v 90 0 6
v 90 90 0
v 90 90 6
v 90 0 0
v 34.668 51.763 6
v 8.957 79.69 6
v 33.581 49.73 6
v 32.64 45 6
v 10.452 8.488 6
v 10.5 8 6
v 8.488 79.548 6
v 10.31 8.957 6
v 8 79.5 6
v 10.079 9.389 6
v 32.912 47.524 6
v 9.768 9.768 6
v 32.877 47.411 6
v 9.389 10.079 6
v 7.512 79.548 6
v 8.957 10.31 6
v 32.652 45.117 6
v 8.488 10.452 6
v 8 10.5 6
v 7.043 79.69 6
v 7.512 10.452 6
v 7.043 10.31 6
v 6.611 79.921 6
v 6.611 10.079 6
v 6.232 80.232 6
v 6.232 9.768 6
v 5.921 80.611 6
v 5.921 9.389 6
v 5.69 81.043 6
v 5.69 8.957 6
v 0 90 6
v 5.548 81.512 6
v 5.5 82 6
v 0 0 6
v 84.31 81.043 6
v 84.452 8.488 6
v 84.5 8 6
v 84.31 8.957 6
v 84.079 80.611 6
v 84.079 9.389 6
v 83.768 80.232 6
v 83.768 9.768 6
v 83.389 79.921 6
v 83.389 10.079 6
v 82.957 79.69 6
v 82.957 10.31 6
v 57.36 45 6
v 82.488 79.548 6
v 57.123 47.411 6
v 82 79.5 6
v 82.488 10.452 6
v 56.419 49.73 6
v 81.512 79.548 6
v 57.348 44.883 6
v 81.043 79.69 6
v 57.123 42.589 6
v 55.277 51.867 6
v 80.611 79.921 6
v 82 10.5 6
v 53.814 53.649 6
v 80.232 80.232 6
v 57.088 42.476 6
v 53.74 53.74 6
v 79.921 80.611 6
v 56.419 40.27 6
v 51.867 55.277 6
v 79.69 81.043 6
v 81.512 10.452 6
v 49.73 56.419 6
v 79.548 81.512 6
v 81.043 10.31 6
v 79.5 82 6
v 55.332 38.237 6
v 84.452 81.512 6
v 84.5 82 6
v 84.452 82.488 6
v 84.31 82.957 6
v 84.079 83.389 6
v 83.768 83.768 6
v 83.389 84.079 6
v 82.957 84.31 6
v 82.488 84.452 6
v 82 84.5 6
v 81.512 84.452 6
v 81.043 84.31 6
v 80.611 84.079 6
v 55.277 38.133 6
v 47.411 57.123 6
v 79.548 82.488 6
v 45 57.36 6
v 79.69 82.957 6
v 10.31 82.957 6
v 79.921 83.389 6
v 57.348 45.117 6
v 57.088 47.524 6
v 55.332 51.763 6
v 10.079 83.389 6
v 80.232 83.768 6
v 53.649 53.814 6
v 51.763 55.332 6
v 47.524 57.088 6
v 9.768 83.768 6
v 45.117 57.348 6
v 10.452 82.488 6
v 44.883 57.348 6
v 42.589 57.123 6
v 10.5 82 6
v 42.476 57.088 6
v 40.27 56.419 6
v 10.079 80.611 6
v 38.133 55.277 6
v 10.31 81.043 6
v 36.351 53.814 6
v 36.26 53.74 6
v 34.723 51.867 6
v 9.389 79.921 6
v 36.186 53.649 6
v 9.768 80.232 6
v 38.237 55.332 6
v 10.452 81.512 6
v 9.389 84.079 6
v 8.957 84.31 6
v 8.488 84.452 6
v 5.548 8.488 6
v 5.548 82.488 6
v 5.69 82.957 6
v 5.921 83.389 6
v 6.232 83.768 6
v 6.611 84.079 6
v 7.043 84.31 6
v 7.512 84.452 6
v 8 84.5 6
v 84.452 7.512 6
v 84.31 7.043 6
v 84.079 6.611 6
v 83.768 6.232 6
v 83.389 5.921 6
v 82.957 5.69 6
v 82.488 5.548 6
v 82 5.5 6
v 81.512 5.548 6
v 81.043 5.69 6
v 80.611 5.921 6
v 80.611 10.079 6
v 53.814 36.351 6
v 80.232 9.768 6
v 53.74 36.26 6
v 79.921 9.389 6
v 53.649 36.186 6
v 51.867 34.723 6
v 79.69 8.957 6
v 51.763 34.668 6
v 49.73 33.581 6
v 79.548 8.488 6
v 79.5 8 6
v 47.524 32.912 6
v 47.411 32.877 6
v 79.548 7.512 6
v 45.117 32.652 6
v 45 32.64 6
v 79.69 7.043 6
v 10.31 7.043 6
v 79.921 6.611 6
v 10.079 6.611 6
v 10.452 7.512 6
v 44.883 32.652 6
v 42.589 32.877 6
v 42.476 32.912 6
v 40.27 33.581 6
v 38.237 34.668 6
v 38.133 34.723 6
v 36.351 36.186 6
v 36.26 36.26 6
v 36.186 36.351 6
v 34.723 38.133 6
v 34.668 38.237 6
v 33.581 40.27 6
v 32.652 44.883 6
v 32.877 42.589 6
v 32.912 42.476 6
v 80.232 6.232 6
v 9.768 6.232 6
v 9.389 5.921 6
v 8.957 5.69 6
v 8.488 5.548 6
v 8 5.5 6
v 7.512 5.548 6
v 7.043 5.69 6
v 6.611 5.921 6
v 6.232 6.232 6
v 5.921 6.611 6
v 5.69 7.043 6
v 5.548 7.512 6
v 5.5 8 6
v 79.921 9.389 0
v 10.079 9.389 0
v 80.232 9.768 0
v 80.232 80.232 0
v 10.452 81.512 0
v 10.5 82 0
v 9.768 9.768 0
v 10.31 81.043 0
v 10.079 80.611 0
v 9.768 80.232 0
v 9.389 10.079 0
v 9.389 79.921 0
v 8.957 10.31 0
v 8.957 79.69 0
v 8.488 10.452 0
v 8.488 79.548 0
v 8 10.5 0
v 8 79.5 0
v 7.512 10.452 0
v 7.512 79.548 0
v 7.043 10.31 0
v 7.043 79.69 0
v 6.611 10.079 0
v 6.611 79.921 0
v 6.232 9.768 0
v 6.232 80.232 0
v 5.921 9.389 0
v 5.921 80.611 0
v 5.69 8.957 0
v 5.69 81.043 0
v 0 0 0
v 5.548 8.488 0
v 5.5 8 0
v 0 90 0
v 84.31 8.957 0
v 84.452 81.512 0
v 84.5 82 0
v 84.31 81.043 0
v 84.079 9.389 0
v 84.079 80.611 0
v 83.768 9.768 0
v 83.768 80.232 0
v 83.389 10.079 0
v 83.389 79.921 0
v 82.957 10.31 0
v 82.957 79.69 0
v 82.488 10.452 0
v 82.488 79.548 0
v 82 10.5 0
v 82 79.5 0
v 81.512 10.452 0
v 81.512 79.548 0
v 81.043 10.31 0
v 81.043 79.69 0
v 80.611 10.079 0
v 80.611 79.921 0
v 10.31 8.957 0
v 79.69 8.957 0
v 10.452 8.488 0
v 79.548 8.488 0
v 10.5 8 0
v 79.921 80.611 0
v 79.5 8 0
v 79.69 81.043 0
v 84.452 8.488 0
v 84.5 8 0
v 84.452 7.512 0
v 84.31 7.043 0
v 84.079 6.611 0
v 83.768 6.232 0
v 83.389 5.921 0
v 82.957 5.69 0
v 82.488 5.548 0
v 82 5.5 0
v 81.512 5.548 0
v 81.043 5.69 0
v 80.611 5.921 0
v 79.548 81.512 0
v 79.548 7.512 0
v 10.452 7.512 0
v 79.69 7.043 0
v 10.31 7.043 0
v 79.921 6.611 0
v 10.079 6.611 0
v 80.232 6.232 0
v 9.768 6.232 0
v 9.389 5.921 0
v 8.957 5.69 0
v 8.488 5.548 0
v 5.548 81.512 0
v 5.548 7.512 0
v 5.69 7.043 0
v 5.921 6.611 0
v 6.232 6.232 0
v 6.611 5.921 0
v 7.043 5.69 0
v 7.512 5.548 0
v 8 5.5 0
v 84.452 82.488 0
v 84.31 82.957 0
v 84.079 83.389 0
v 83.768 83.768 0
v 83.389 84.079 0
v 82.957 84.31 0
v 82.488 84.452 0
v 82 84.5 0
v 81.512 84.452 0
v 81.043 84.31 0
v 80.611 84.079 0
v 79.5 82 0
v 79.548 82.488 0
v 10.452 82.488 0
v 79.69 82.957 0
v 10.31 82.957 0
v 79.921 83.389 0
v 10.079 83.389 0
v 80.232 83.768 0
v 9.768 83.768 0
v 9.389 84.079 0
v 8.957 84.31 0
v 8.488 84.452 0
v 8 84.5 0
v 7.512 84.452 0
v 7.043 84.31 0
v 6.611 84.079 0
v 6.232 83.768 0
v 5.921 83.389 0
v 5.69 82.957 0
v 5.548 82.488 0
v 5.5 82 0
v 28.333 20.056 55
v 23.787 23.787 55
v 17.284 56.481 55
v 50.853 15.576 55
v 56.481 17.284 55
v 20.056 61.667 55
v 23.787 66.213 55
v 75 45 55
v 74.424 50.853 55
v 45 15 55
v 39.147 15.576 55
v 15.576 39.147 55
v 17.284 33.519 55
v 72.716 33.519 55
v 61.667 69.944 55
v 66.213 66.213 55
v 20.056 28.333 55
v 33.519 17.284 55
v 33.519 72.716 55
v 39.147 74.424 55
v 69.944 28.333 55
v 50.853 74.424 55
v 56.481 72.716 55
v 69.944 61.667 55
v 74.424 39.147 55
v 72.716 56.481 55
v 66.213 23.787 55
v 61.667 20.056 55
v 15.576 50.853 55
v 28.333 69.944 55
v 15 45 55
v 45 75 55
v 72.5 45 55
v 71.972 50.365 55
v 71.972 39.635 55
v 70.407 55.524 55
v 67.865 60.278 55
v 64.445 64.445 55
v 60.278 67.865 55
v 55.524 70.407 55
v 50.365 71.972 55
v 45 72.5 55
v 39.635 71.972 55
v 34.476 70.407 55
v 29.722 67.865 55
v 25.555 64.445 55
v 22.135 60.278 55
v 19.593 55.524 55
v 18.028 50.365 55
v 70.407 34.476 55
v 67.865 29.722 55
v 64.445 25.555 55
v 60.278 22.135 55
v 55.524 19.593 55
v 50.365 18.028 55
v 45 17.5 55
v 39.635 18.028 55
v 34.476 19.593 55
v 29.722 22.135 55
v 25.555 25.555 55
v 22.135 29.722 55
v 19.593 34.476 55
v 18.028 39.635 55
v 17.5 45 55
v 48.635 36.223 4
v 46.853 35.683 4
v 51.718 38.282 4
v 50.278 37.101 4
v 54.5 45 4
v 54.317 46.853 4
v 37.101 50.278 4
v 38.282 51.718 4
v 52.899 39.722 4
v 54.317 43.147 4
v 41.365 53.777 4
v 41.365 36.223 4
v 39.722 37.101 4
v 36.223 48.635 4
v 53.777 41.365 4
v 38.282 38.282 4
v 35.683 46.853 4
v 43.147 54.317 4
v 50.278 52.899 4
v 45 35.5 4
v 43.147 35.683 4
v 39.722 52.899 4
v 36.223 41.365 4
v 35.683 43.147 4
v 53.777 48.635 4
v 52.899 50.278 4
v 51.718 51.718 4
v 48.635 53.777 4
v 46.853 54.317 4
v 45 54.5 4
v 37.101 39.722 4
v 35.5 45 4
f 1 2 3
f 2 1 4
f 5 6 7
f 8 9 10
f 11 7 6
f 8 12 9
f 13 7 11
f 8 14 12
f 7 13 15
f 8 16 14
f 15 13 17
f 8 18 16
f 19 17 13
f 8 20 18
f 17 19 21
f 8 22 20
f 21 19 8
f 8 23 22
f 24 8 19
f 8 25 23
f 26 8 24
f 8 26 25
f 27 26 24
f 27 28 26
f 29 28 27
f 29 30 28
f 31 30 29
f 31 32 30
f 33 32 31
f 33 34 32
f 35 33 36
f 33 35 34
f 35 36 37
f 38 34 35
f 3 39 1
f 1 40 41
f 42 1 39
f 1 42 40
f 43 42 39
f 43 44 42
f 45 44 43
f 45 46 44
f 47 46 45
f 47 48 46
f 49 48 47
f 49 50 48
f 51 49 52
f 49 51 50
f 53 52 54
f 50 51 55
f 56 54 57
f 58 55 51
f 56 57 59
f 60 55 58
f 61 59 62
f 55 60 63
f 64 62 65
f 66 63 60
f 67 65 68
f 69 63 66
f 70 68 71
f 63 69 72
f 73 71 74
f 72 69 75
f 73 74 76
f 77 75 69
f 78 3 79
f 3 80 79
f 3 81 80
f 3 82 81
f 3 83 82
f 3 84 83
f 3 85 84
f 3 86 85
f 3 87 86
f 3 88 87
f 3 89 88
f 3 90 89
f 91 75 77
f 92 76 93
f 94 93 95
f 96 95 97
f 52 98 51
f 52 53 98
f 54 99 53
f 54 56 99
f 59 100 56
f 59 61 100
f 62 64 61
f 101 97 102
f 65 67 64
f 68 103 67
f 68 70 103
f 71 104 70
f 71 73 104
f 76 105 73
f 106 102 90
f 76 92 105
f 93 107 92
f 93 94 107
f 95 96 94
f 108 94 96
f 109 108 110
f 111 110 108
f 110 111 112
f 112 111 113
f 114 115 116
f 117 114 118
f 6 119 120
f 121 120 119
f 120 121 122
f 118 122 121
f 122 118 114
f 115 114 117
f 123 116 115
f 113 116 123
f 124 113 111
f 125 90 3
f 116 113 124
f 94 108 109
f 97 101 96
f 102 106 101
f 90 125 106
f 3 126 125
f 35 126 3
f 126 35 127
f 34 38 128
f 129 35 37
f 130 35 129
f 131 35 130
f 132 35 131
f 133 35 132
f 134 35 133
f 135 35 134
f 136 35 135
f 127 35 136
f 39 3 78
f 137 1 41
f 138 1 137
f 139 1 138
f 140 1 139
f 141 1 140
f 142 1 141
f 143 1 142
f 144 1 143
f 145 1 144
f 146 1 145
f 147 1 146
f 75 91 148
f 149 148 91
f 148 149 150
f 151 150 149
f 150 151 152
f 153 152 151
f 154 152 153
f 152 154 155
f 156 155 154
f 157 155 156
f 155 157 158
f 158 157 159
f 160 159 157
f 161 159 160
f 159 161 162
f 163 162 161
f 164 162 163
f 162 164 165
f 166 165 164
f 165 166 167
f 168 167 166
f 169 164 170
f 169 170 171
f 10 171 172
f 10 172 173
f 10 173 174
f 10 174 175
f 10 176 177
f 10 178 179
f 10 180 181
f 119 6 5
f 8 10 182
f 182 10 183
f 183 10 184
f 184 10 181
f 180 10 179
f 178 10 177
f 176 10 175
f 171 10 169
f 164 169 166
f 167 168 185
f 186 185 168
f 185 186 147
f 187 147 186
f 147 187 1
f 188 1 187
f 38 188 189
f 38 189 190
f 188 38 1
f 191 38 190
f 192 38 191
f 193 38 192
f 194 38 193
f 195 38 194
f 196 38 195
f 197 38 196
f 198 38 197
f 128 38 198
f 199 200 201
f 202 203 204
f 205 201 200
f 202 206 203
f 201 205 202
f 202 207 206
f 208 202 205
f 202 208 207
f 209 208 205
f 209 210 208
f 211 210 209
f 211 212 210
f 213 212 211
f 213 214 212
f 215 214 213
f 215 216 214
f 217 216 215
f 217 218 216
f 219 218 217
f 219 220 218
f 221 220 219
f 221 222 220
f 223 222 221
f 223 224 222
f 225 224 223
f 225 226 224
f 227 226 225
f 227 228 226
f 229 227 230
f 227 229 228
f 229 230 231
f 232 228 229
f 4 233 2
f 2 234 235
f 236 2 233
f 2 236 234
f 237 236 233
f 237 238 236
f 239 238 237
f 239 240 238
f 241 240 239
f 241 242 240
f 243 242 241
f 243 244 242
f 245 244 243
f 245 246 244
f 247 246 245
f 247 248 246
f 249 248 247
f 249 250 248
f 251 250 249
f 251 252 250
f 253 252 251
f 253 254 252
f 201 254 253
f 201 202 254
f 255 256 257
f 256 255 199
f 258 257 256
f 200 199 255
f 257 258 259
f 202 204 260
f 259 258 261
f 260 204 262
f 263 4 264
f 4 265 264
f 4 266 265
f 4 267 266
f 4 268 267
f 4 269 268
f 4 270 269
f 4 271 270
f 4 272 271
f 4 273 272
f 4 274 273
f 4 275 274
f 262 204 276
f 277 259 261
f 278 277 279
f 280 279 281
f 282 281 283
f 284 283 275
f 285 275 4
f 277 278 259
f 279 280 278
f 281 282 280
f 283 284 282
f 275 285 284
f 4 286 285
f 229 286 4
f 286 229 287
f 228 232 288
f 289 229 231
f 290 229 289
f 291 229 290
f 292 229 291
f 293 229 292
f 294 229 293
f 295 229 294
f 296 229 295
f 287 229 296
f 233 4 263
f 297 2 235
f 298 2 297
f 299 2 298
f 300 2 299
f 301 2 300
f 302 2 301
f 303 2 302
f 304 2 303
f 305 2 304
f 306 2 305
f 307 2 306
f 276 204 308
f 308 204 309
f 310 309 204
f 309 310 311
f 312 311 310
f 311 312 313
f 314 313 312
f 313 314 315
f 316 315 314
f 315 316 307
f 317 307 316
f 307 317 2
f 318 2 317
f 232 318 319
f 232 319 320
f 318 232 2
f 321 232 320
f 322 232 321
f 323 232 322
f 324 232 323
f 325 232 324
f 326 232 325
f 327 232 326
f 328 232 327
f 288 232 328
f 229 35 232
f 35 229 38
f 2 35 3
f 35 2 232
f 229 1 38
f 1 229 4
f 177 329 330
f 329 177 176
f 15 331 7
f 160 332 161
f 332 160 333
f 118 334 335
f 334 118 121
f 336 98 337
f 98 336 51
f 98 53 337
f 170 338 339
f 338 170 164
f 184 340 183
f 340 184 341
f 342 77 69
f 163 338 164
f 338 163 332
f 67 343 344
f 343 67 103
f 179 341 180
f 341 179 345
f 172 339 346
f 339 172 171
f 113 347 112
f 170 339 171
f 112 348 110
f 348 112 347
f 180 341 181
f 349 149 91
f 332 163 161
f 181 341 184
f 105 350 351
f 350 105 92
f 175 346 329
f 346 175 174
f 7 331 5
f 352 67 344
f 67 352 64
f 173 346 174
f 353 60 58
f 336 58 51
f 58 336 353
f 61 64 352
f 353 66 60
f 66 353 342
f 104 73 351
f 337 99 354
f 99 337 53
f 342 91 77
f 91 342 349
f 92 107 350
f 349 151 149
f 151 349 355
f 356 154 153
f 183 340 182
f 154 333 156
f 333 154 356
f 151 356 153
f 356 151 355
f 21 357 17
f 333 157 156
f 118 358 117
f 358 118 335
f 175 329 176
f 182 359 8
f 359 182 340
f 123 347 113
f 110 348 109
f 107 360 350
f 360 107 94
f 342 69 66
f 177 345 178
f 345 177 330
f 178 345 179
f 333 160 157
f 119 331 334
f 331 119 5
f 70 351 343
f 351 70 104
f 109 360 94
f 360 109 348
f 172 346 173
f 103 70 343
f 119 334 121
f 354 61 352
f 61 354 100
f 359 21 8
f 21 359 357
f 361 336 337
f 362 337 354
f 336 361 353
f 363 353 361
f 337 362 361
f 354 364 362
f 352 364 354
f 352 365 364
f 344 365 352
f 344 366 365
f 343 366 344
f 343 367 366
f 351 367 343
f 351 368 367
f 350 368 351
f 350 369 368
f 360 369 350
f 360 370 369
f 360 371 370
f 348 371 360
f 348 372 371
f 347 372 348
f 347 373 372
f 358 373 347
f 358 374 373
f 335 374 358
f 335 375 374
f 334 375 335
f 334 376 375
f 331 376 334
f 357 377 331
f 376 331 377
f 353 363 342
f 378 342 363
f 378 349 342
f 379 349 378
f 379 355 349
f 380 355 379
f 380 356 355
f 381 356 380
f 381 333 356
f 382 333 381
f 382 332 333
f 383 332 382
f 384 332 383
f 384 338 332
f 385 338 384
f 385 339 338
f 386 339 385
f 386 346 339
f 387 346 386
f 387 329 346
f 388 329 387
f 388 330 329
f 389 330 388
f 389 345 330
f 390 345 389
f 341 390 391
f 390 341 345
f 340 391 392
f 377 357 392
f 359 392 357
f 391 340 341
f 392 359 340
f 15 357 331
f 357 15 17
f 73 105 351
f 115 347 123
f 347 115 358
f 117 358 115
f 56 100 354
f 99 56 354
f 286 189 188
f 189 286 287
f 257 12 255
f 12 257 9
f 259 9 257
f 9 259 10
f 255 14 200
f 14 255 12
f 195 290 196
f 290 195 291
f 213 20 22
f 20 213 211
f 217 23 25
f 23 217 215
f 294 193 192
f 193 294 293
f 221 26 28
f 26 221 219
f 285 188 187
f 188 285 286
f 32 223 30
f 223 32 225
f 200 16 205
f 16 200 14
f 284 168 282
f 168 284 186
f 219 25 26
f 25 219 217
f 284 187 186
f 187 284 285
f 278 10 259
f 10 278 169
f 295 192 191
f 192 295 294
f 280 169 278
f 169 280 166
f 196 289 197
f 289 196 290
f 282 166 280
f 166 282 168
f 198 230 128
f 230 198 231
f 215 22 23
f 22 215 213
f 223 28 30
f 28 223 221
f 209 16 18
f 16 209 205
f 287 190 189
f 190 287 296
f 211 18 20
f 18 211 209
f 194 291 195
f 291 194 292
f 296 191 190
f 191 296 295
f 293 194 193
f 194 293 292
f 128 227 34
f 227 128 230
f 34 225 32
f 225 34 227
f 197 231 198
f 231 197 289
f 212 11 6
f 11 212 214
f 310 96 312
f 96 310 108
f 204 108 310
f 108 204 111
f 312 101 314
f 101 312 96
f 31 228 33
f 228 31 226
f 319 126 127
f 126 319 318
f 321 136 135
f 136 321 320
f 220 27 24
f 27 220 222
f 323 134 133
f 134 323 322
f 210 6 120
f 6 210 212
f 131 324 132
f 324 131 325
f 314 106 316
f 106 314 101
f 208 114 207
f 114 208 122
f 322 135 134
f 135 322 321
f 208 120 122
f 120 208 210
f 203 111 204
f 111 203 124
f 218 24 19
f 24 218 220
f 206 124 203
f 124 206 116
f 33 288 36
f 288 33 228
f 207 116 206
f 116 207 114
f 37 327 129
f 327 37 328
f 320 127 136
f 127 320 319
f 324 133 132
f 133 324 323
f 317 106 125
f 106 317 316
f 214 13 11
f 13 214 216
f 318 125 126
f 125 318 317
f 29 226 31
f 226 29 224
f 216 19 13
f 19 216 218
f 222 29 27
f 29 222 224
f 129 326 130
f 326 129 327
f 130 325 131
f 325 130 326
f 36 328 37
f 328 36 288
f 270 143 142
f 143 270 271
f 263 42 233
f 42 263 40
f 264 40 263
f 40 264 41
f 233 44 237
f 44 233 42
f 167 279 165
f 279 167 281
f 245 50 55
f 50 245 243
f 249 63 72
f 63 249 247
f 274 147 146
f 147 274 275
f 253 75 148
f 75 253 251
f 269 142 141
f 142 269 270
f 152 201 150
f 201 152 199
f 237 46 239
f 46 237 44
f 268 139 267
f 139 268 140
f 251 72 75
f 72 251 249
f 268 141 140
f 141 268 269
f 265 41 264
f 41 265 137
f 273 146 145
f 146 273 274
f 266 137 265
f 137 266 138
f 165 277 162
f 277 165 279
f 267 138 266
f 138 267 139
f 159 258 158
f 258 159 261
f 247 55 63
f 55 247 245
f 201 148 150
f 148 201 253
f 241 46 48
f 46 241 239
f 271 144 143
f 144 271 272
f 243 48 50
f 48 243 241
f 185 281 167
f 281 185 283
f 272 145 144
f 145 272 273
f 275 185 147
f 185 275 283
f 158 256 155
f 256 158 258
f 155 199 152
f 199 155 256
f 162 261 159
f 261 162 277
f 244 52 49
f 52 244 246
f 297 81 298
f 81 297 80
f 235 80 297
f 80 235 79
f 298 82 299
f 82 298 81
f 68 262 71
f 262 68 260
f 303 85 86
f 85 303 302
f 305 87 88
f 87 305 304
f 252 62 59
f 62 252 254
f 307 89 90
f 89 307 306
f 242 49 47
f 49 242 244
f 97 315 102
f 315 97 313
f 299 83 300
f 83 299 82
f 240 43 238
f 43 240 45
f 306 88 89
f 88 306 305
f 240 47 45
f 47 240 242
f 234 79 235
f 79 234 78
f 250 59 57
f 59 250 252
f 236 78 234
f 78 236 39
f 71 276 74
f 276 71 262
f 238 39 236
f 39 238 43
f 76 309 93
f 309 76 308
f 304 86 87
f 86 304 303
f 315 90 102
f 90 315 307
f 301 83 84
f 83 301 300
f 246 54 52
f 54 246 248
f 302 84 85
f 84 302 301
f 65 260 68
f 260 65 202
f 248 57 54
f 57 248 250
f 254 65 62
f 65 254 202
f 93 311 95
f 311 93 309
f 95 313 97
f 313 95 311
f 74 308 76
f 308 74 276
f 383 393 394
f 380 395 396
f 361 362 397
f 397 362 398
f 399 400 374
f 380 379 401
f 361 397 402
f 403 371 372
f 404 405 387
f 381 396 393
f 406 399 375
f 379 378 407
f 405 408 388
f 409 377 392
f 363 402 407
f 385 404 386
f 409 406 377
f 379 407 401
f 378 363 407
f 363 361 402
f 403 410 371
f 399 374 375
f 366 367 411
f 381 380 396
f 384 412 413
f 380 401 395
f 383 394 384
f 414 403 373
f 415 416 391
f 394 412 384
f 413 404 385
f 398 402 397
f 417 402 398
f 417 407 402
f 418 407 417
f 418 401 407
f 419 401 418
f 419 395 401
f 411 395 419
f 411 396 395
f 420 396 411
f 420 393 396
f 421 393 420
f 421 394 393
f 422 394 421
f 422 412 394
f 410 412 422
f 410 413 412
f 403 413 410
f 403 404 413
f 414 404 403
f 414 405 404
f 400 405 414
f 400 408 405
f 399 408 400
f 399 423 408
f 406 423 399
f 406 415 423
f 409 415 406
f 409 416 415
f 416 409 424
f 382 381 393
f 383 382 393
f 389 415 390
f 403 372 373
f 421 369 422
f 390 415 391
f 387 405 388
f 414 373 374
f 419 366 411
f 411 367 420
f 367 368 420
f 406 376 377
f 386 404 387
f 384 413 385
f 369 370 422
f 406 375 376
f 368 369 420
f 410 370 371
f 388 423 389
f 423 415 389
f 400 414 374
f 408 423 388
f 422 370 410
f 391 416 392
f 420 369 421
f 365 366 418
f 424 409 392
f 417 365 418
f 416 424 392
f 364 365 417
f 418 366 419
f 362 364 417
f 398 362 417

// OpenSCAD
$fn = 32;

// ----------------------------------------------------------------------
// Hopper: flanged with square flange
// ----------------------------------------------------------------------

// --- parameters (mm) ---
fl = 90;                  // flange side, X and Y
fl_t = 6;                 // flange thickness
cone_h = 50;              // cone height above the flange
top_d = 60;               // cone mouth diameter
bot_d = 24;               // cone spout diameter
wall = 2.5;               // cone wall thickness
hole_r = 2.5;             // flange hole radius
hole_in = 8;              // hole inset from the corners
fit_tol = 0.05;           // tolerance for press fits, mm
free_tol = 0.2;           // tolerance for clearance fits, mm

bore_d = bot_d - 2 * wall;  // spout bore diameter
total_h = fl_t + cone_h - 1;  // overall height

difference() {
  union() {
    cube([fl, fl, fl_t]);
    translate([fl / 2, fl / 2, fl_t - 1])
      cylinder(h = cone_h, d1 = bot_d, d2 = top_d);
  }
  translate([fl / 2, fl / 2, fl_t - 2])
    cylinder(h = cone_h + 1, d1 = bore_d, d2 = top_d - 2 * wall);
  for (sx = [0, 1], sy = [0, 1])
    translate([sx ? fl - hole_in : hole_in,
               sy ? fl - hole_in : hole_in, -1])
      cylinder(r = hole_r, h = fl_t + 2);
}
